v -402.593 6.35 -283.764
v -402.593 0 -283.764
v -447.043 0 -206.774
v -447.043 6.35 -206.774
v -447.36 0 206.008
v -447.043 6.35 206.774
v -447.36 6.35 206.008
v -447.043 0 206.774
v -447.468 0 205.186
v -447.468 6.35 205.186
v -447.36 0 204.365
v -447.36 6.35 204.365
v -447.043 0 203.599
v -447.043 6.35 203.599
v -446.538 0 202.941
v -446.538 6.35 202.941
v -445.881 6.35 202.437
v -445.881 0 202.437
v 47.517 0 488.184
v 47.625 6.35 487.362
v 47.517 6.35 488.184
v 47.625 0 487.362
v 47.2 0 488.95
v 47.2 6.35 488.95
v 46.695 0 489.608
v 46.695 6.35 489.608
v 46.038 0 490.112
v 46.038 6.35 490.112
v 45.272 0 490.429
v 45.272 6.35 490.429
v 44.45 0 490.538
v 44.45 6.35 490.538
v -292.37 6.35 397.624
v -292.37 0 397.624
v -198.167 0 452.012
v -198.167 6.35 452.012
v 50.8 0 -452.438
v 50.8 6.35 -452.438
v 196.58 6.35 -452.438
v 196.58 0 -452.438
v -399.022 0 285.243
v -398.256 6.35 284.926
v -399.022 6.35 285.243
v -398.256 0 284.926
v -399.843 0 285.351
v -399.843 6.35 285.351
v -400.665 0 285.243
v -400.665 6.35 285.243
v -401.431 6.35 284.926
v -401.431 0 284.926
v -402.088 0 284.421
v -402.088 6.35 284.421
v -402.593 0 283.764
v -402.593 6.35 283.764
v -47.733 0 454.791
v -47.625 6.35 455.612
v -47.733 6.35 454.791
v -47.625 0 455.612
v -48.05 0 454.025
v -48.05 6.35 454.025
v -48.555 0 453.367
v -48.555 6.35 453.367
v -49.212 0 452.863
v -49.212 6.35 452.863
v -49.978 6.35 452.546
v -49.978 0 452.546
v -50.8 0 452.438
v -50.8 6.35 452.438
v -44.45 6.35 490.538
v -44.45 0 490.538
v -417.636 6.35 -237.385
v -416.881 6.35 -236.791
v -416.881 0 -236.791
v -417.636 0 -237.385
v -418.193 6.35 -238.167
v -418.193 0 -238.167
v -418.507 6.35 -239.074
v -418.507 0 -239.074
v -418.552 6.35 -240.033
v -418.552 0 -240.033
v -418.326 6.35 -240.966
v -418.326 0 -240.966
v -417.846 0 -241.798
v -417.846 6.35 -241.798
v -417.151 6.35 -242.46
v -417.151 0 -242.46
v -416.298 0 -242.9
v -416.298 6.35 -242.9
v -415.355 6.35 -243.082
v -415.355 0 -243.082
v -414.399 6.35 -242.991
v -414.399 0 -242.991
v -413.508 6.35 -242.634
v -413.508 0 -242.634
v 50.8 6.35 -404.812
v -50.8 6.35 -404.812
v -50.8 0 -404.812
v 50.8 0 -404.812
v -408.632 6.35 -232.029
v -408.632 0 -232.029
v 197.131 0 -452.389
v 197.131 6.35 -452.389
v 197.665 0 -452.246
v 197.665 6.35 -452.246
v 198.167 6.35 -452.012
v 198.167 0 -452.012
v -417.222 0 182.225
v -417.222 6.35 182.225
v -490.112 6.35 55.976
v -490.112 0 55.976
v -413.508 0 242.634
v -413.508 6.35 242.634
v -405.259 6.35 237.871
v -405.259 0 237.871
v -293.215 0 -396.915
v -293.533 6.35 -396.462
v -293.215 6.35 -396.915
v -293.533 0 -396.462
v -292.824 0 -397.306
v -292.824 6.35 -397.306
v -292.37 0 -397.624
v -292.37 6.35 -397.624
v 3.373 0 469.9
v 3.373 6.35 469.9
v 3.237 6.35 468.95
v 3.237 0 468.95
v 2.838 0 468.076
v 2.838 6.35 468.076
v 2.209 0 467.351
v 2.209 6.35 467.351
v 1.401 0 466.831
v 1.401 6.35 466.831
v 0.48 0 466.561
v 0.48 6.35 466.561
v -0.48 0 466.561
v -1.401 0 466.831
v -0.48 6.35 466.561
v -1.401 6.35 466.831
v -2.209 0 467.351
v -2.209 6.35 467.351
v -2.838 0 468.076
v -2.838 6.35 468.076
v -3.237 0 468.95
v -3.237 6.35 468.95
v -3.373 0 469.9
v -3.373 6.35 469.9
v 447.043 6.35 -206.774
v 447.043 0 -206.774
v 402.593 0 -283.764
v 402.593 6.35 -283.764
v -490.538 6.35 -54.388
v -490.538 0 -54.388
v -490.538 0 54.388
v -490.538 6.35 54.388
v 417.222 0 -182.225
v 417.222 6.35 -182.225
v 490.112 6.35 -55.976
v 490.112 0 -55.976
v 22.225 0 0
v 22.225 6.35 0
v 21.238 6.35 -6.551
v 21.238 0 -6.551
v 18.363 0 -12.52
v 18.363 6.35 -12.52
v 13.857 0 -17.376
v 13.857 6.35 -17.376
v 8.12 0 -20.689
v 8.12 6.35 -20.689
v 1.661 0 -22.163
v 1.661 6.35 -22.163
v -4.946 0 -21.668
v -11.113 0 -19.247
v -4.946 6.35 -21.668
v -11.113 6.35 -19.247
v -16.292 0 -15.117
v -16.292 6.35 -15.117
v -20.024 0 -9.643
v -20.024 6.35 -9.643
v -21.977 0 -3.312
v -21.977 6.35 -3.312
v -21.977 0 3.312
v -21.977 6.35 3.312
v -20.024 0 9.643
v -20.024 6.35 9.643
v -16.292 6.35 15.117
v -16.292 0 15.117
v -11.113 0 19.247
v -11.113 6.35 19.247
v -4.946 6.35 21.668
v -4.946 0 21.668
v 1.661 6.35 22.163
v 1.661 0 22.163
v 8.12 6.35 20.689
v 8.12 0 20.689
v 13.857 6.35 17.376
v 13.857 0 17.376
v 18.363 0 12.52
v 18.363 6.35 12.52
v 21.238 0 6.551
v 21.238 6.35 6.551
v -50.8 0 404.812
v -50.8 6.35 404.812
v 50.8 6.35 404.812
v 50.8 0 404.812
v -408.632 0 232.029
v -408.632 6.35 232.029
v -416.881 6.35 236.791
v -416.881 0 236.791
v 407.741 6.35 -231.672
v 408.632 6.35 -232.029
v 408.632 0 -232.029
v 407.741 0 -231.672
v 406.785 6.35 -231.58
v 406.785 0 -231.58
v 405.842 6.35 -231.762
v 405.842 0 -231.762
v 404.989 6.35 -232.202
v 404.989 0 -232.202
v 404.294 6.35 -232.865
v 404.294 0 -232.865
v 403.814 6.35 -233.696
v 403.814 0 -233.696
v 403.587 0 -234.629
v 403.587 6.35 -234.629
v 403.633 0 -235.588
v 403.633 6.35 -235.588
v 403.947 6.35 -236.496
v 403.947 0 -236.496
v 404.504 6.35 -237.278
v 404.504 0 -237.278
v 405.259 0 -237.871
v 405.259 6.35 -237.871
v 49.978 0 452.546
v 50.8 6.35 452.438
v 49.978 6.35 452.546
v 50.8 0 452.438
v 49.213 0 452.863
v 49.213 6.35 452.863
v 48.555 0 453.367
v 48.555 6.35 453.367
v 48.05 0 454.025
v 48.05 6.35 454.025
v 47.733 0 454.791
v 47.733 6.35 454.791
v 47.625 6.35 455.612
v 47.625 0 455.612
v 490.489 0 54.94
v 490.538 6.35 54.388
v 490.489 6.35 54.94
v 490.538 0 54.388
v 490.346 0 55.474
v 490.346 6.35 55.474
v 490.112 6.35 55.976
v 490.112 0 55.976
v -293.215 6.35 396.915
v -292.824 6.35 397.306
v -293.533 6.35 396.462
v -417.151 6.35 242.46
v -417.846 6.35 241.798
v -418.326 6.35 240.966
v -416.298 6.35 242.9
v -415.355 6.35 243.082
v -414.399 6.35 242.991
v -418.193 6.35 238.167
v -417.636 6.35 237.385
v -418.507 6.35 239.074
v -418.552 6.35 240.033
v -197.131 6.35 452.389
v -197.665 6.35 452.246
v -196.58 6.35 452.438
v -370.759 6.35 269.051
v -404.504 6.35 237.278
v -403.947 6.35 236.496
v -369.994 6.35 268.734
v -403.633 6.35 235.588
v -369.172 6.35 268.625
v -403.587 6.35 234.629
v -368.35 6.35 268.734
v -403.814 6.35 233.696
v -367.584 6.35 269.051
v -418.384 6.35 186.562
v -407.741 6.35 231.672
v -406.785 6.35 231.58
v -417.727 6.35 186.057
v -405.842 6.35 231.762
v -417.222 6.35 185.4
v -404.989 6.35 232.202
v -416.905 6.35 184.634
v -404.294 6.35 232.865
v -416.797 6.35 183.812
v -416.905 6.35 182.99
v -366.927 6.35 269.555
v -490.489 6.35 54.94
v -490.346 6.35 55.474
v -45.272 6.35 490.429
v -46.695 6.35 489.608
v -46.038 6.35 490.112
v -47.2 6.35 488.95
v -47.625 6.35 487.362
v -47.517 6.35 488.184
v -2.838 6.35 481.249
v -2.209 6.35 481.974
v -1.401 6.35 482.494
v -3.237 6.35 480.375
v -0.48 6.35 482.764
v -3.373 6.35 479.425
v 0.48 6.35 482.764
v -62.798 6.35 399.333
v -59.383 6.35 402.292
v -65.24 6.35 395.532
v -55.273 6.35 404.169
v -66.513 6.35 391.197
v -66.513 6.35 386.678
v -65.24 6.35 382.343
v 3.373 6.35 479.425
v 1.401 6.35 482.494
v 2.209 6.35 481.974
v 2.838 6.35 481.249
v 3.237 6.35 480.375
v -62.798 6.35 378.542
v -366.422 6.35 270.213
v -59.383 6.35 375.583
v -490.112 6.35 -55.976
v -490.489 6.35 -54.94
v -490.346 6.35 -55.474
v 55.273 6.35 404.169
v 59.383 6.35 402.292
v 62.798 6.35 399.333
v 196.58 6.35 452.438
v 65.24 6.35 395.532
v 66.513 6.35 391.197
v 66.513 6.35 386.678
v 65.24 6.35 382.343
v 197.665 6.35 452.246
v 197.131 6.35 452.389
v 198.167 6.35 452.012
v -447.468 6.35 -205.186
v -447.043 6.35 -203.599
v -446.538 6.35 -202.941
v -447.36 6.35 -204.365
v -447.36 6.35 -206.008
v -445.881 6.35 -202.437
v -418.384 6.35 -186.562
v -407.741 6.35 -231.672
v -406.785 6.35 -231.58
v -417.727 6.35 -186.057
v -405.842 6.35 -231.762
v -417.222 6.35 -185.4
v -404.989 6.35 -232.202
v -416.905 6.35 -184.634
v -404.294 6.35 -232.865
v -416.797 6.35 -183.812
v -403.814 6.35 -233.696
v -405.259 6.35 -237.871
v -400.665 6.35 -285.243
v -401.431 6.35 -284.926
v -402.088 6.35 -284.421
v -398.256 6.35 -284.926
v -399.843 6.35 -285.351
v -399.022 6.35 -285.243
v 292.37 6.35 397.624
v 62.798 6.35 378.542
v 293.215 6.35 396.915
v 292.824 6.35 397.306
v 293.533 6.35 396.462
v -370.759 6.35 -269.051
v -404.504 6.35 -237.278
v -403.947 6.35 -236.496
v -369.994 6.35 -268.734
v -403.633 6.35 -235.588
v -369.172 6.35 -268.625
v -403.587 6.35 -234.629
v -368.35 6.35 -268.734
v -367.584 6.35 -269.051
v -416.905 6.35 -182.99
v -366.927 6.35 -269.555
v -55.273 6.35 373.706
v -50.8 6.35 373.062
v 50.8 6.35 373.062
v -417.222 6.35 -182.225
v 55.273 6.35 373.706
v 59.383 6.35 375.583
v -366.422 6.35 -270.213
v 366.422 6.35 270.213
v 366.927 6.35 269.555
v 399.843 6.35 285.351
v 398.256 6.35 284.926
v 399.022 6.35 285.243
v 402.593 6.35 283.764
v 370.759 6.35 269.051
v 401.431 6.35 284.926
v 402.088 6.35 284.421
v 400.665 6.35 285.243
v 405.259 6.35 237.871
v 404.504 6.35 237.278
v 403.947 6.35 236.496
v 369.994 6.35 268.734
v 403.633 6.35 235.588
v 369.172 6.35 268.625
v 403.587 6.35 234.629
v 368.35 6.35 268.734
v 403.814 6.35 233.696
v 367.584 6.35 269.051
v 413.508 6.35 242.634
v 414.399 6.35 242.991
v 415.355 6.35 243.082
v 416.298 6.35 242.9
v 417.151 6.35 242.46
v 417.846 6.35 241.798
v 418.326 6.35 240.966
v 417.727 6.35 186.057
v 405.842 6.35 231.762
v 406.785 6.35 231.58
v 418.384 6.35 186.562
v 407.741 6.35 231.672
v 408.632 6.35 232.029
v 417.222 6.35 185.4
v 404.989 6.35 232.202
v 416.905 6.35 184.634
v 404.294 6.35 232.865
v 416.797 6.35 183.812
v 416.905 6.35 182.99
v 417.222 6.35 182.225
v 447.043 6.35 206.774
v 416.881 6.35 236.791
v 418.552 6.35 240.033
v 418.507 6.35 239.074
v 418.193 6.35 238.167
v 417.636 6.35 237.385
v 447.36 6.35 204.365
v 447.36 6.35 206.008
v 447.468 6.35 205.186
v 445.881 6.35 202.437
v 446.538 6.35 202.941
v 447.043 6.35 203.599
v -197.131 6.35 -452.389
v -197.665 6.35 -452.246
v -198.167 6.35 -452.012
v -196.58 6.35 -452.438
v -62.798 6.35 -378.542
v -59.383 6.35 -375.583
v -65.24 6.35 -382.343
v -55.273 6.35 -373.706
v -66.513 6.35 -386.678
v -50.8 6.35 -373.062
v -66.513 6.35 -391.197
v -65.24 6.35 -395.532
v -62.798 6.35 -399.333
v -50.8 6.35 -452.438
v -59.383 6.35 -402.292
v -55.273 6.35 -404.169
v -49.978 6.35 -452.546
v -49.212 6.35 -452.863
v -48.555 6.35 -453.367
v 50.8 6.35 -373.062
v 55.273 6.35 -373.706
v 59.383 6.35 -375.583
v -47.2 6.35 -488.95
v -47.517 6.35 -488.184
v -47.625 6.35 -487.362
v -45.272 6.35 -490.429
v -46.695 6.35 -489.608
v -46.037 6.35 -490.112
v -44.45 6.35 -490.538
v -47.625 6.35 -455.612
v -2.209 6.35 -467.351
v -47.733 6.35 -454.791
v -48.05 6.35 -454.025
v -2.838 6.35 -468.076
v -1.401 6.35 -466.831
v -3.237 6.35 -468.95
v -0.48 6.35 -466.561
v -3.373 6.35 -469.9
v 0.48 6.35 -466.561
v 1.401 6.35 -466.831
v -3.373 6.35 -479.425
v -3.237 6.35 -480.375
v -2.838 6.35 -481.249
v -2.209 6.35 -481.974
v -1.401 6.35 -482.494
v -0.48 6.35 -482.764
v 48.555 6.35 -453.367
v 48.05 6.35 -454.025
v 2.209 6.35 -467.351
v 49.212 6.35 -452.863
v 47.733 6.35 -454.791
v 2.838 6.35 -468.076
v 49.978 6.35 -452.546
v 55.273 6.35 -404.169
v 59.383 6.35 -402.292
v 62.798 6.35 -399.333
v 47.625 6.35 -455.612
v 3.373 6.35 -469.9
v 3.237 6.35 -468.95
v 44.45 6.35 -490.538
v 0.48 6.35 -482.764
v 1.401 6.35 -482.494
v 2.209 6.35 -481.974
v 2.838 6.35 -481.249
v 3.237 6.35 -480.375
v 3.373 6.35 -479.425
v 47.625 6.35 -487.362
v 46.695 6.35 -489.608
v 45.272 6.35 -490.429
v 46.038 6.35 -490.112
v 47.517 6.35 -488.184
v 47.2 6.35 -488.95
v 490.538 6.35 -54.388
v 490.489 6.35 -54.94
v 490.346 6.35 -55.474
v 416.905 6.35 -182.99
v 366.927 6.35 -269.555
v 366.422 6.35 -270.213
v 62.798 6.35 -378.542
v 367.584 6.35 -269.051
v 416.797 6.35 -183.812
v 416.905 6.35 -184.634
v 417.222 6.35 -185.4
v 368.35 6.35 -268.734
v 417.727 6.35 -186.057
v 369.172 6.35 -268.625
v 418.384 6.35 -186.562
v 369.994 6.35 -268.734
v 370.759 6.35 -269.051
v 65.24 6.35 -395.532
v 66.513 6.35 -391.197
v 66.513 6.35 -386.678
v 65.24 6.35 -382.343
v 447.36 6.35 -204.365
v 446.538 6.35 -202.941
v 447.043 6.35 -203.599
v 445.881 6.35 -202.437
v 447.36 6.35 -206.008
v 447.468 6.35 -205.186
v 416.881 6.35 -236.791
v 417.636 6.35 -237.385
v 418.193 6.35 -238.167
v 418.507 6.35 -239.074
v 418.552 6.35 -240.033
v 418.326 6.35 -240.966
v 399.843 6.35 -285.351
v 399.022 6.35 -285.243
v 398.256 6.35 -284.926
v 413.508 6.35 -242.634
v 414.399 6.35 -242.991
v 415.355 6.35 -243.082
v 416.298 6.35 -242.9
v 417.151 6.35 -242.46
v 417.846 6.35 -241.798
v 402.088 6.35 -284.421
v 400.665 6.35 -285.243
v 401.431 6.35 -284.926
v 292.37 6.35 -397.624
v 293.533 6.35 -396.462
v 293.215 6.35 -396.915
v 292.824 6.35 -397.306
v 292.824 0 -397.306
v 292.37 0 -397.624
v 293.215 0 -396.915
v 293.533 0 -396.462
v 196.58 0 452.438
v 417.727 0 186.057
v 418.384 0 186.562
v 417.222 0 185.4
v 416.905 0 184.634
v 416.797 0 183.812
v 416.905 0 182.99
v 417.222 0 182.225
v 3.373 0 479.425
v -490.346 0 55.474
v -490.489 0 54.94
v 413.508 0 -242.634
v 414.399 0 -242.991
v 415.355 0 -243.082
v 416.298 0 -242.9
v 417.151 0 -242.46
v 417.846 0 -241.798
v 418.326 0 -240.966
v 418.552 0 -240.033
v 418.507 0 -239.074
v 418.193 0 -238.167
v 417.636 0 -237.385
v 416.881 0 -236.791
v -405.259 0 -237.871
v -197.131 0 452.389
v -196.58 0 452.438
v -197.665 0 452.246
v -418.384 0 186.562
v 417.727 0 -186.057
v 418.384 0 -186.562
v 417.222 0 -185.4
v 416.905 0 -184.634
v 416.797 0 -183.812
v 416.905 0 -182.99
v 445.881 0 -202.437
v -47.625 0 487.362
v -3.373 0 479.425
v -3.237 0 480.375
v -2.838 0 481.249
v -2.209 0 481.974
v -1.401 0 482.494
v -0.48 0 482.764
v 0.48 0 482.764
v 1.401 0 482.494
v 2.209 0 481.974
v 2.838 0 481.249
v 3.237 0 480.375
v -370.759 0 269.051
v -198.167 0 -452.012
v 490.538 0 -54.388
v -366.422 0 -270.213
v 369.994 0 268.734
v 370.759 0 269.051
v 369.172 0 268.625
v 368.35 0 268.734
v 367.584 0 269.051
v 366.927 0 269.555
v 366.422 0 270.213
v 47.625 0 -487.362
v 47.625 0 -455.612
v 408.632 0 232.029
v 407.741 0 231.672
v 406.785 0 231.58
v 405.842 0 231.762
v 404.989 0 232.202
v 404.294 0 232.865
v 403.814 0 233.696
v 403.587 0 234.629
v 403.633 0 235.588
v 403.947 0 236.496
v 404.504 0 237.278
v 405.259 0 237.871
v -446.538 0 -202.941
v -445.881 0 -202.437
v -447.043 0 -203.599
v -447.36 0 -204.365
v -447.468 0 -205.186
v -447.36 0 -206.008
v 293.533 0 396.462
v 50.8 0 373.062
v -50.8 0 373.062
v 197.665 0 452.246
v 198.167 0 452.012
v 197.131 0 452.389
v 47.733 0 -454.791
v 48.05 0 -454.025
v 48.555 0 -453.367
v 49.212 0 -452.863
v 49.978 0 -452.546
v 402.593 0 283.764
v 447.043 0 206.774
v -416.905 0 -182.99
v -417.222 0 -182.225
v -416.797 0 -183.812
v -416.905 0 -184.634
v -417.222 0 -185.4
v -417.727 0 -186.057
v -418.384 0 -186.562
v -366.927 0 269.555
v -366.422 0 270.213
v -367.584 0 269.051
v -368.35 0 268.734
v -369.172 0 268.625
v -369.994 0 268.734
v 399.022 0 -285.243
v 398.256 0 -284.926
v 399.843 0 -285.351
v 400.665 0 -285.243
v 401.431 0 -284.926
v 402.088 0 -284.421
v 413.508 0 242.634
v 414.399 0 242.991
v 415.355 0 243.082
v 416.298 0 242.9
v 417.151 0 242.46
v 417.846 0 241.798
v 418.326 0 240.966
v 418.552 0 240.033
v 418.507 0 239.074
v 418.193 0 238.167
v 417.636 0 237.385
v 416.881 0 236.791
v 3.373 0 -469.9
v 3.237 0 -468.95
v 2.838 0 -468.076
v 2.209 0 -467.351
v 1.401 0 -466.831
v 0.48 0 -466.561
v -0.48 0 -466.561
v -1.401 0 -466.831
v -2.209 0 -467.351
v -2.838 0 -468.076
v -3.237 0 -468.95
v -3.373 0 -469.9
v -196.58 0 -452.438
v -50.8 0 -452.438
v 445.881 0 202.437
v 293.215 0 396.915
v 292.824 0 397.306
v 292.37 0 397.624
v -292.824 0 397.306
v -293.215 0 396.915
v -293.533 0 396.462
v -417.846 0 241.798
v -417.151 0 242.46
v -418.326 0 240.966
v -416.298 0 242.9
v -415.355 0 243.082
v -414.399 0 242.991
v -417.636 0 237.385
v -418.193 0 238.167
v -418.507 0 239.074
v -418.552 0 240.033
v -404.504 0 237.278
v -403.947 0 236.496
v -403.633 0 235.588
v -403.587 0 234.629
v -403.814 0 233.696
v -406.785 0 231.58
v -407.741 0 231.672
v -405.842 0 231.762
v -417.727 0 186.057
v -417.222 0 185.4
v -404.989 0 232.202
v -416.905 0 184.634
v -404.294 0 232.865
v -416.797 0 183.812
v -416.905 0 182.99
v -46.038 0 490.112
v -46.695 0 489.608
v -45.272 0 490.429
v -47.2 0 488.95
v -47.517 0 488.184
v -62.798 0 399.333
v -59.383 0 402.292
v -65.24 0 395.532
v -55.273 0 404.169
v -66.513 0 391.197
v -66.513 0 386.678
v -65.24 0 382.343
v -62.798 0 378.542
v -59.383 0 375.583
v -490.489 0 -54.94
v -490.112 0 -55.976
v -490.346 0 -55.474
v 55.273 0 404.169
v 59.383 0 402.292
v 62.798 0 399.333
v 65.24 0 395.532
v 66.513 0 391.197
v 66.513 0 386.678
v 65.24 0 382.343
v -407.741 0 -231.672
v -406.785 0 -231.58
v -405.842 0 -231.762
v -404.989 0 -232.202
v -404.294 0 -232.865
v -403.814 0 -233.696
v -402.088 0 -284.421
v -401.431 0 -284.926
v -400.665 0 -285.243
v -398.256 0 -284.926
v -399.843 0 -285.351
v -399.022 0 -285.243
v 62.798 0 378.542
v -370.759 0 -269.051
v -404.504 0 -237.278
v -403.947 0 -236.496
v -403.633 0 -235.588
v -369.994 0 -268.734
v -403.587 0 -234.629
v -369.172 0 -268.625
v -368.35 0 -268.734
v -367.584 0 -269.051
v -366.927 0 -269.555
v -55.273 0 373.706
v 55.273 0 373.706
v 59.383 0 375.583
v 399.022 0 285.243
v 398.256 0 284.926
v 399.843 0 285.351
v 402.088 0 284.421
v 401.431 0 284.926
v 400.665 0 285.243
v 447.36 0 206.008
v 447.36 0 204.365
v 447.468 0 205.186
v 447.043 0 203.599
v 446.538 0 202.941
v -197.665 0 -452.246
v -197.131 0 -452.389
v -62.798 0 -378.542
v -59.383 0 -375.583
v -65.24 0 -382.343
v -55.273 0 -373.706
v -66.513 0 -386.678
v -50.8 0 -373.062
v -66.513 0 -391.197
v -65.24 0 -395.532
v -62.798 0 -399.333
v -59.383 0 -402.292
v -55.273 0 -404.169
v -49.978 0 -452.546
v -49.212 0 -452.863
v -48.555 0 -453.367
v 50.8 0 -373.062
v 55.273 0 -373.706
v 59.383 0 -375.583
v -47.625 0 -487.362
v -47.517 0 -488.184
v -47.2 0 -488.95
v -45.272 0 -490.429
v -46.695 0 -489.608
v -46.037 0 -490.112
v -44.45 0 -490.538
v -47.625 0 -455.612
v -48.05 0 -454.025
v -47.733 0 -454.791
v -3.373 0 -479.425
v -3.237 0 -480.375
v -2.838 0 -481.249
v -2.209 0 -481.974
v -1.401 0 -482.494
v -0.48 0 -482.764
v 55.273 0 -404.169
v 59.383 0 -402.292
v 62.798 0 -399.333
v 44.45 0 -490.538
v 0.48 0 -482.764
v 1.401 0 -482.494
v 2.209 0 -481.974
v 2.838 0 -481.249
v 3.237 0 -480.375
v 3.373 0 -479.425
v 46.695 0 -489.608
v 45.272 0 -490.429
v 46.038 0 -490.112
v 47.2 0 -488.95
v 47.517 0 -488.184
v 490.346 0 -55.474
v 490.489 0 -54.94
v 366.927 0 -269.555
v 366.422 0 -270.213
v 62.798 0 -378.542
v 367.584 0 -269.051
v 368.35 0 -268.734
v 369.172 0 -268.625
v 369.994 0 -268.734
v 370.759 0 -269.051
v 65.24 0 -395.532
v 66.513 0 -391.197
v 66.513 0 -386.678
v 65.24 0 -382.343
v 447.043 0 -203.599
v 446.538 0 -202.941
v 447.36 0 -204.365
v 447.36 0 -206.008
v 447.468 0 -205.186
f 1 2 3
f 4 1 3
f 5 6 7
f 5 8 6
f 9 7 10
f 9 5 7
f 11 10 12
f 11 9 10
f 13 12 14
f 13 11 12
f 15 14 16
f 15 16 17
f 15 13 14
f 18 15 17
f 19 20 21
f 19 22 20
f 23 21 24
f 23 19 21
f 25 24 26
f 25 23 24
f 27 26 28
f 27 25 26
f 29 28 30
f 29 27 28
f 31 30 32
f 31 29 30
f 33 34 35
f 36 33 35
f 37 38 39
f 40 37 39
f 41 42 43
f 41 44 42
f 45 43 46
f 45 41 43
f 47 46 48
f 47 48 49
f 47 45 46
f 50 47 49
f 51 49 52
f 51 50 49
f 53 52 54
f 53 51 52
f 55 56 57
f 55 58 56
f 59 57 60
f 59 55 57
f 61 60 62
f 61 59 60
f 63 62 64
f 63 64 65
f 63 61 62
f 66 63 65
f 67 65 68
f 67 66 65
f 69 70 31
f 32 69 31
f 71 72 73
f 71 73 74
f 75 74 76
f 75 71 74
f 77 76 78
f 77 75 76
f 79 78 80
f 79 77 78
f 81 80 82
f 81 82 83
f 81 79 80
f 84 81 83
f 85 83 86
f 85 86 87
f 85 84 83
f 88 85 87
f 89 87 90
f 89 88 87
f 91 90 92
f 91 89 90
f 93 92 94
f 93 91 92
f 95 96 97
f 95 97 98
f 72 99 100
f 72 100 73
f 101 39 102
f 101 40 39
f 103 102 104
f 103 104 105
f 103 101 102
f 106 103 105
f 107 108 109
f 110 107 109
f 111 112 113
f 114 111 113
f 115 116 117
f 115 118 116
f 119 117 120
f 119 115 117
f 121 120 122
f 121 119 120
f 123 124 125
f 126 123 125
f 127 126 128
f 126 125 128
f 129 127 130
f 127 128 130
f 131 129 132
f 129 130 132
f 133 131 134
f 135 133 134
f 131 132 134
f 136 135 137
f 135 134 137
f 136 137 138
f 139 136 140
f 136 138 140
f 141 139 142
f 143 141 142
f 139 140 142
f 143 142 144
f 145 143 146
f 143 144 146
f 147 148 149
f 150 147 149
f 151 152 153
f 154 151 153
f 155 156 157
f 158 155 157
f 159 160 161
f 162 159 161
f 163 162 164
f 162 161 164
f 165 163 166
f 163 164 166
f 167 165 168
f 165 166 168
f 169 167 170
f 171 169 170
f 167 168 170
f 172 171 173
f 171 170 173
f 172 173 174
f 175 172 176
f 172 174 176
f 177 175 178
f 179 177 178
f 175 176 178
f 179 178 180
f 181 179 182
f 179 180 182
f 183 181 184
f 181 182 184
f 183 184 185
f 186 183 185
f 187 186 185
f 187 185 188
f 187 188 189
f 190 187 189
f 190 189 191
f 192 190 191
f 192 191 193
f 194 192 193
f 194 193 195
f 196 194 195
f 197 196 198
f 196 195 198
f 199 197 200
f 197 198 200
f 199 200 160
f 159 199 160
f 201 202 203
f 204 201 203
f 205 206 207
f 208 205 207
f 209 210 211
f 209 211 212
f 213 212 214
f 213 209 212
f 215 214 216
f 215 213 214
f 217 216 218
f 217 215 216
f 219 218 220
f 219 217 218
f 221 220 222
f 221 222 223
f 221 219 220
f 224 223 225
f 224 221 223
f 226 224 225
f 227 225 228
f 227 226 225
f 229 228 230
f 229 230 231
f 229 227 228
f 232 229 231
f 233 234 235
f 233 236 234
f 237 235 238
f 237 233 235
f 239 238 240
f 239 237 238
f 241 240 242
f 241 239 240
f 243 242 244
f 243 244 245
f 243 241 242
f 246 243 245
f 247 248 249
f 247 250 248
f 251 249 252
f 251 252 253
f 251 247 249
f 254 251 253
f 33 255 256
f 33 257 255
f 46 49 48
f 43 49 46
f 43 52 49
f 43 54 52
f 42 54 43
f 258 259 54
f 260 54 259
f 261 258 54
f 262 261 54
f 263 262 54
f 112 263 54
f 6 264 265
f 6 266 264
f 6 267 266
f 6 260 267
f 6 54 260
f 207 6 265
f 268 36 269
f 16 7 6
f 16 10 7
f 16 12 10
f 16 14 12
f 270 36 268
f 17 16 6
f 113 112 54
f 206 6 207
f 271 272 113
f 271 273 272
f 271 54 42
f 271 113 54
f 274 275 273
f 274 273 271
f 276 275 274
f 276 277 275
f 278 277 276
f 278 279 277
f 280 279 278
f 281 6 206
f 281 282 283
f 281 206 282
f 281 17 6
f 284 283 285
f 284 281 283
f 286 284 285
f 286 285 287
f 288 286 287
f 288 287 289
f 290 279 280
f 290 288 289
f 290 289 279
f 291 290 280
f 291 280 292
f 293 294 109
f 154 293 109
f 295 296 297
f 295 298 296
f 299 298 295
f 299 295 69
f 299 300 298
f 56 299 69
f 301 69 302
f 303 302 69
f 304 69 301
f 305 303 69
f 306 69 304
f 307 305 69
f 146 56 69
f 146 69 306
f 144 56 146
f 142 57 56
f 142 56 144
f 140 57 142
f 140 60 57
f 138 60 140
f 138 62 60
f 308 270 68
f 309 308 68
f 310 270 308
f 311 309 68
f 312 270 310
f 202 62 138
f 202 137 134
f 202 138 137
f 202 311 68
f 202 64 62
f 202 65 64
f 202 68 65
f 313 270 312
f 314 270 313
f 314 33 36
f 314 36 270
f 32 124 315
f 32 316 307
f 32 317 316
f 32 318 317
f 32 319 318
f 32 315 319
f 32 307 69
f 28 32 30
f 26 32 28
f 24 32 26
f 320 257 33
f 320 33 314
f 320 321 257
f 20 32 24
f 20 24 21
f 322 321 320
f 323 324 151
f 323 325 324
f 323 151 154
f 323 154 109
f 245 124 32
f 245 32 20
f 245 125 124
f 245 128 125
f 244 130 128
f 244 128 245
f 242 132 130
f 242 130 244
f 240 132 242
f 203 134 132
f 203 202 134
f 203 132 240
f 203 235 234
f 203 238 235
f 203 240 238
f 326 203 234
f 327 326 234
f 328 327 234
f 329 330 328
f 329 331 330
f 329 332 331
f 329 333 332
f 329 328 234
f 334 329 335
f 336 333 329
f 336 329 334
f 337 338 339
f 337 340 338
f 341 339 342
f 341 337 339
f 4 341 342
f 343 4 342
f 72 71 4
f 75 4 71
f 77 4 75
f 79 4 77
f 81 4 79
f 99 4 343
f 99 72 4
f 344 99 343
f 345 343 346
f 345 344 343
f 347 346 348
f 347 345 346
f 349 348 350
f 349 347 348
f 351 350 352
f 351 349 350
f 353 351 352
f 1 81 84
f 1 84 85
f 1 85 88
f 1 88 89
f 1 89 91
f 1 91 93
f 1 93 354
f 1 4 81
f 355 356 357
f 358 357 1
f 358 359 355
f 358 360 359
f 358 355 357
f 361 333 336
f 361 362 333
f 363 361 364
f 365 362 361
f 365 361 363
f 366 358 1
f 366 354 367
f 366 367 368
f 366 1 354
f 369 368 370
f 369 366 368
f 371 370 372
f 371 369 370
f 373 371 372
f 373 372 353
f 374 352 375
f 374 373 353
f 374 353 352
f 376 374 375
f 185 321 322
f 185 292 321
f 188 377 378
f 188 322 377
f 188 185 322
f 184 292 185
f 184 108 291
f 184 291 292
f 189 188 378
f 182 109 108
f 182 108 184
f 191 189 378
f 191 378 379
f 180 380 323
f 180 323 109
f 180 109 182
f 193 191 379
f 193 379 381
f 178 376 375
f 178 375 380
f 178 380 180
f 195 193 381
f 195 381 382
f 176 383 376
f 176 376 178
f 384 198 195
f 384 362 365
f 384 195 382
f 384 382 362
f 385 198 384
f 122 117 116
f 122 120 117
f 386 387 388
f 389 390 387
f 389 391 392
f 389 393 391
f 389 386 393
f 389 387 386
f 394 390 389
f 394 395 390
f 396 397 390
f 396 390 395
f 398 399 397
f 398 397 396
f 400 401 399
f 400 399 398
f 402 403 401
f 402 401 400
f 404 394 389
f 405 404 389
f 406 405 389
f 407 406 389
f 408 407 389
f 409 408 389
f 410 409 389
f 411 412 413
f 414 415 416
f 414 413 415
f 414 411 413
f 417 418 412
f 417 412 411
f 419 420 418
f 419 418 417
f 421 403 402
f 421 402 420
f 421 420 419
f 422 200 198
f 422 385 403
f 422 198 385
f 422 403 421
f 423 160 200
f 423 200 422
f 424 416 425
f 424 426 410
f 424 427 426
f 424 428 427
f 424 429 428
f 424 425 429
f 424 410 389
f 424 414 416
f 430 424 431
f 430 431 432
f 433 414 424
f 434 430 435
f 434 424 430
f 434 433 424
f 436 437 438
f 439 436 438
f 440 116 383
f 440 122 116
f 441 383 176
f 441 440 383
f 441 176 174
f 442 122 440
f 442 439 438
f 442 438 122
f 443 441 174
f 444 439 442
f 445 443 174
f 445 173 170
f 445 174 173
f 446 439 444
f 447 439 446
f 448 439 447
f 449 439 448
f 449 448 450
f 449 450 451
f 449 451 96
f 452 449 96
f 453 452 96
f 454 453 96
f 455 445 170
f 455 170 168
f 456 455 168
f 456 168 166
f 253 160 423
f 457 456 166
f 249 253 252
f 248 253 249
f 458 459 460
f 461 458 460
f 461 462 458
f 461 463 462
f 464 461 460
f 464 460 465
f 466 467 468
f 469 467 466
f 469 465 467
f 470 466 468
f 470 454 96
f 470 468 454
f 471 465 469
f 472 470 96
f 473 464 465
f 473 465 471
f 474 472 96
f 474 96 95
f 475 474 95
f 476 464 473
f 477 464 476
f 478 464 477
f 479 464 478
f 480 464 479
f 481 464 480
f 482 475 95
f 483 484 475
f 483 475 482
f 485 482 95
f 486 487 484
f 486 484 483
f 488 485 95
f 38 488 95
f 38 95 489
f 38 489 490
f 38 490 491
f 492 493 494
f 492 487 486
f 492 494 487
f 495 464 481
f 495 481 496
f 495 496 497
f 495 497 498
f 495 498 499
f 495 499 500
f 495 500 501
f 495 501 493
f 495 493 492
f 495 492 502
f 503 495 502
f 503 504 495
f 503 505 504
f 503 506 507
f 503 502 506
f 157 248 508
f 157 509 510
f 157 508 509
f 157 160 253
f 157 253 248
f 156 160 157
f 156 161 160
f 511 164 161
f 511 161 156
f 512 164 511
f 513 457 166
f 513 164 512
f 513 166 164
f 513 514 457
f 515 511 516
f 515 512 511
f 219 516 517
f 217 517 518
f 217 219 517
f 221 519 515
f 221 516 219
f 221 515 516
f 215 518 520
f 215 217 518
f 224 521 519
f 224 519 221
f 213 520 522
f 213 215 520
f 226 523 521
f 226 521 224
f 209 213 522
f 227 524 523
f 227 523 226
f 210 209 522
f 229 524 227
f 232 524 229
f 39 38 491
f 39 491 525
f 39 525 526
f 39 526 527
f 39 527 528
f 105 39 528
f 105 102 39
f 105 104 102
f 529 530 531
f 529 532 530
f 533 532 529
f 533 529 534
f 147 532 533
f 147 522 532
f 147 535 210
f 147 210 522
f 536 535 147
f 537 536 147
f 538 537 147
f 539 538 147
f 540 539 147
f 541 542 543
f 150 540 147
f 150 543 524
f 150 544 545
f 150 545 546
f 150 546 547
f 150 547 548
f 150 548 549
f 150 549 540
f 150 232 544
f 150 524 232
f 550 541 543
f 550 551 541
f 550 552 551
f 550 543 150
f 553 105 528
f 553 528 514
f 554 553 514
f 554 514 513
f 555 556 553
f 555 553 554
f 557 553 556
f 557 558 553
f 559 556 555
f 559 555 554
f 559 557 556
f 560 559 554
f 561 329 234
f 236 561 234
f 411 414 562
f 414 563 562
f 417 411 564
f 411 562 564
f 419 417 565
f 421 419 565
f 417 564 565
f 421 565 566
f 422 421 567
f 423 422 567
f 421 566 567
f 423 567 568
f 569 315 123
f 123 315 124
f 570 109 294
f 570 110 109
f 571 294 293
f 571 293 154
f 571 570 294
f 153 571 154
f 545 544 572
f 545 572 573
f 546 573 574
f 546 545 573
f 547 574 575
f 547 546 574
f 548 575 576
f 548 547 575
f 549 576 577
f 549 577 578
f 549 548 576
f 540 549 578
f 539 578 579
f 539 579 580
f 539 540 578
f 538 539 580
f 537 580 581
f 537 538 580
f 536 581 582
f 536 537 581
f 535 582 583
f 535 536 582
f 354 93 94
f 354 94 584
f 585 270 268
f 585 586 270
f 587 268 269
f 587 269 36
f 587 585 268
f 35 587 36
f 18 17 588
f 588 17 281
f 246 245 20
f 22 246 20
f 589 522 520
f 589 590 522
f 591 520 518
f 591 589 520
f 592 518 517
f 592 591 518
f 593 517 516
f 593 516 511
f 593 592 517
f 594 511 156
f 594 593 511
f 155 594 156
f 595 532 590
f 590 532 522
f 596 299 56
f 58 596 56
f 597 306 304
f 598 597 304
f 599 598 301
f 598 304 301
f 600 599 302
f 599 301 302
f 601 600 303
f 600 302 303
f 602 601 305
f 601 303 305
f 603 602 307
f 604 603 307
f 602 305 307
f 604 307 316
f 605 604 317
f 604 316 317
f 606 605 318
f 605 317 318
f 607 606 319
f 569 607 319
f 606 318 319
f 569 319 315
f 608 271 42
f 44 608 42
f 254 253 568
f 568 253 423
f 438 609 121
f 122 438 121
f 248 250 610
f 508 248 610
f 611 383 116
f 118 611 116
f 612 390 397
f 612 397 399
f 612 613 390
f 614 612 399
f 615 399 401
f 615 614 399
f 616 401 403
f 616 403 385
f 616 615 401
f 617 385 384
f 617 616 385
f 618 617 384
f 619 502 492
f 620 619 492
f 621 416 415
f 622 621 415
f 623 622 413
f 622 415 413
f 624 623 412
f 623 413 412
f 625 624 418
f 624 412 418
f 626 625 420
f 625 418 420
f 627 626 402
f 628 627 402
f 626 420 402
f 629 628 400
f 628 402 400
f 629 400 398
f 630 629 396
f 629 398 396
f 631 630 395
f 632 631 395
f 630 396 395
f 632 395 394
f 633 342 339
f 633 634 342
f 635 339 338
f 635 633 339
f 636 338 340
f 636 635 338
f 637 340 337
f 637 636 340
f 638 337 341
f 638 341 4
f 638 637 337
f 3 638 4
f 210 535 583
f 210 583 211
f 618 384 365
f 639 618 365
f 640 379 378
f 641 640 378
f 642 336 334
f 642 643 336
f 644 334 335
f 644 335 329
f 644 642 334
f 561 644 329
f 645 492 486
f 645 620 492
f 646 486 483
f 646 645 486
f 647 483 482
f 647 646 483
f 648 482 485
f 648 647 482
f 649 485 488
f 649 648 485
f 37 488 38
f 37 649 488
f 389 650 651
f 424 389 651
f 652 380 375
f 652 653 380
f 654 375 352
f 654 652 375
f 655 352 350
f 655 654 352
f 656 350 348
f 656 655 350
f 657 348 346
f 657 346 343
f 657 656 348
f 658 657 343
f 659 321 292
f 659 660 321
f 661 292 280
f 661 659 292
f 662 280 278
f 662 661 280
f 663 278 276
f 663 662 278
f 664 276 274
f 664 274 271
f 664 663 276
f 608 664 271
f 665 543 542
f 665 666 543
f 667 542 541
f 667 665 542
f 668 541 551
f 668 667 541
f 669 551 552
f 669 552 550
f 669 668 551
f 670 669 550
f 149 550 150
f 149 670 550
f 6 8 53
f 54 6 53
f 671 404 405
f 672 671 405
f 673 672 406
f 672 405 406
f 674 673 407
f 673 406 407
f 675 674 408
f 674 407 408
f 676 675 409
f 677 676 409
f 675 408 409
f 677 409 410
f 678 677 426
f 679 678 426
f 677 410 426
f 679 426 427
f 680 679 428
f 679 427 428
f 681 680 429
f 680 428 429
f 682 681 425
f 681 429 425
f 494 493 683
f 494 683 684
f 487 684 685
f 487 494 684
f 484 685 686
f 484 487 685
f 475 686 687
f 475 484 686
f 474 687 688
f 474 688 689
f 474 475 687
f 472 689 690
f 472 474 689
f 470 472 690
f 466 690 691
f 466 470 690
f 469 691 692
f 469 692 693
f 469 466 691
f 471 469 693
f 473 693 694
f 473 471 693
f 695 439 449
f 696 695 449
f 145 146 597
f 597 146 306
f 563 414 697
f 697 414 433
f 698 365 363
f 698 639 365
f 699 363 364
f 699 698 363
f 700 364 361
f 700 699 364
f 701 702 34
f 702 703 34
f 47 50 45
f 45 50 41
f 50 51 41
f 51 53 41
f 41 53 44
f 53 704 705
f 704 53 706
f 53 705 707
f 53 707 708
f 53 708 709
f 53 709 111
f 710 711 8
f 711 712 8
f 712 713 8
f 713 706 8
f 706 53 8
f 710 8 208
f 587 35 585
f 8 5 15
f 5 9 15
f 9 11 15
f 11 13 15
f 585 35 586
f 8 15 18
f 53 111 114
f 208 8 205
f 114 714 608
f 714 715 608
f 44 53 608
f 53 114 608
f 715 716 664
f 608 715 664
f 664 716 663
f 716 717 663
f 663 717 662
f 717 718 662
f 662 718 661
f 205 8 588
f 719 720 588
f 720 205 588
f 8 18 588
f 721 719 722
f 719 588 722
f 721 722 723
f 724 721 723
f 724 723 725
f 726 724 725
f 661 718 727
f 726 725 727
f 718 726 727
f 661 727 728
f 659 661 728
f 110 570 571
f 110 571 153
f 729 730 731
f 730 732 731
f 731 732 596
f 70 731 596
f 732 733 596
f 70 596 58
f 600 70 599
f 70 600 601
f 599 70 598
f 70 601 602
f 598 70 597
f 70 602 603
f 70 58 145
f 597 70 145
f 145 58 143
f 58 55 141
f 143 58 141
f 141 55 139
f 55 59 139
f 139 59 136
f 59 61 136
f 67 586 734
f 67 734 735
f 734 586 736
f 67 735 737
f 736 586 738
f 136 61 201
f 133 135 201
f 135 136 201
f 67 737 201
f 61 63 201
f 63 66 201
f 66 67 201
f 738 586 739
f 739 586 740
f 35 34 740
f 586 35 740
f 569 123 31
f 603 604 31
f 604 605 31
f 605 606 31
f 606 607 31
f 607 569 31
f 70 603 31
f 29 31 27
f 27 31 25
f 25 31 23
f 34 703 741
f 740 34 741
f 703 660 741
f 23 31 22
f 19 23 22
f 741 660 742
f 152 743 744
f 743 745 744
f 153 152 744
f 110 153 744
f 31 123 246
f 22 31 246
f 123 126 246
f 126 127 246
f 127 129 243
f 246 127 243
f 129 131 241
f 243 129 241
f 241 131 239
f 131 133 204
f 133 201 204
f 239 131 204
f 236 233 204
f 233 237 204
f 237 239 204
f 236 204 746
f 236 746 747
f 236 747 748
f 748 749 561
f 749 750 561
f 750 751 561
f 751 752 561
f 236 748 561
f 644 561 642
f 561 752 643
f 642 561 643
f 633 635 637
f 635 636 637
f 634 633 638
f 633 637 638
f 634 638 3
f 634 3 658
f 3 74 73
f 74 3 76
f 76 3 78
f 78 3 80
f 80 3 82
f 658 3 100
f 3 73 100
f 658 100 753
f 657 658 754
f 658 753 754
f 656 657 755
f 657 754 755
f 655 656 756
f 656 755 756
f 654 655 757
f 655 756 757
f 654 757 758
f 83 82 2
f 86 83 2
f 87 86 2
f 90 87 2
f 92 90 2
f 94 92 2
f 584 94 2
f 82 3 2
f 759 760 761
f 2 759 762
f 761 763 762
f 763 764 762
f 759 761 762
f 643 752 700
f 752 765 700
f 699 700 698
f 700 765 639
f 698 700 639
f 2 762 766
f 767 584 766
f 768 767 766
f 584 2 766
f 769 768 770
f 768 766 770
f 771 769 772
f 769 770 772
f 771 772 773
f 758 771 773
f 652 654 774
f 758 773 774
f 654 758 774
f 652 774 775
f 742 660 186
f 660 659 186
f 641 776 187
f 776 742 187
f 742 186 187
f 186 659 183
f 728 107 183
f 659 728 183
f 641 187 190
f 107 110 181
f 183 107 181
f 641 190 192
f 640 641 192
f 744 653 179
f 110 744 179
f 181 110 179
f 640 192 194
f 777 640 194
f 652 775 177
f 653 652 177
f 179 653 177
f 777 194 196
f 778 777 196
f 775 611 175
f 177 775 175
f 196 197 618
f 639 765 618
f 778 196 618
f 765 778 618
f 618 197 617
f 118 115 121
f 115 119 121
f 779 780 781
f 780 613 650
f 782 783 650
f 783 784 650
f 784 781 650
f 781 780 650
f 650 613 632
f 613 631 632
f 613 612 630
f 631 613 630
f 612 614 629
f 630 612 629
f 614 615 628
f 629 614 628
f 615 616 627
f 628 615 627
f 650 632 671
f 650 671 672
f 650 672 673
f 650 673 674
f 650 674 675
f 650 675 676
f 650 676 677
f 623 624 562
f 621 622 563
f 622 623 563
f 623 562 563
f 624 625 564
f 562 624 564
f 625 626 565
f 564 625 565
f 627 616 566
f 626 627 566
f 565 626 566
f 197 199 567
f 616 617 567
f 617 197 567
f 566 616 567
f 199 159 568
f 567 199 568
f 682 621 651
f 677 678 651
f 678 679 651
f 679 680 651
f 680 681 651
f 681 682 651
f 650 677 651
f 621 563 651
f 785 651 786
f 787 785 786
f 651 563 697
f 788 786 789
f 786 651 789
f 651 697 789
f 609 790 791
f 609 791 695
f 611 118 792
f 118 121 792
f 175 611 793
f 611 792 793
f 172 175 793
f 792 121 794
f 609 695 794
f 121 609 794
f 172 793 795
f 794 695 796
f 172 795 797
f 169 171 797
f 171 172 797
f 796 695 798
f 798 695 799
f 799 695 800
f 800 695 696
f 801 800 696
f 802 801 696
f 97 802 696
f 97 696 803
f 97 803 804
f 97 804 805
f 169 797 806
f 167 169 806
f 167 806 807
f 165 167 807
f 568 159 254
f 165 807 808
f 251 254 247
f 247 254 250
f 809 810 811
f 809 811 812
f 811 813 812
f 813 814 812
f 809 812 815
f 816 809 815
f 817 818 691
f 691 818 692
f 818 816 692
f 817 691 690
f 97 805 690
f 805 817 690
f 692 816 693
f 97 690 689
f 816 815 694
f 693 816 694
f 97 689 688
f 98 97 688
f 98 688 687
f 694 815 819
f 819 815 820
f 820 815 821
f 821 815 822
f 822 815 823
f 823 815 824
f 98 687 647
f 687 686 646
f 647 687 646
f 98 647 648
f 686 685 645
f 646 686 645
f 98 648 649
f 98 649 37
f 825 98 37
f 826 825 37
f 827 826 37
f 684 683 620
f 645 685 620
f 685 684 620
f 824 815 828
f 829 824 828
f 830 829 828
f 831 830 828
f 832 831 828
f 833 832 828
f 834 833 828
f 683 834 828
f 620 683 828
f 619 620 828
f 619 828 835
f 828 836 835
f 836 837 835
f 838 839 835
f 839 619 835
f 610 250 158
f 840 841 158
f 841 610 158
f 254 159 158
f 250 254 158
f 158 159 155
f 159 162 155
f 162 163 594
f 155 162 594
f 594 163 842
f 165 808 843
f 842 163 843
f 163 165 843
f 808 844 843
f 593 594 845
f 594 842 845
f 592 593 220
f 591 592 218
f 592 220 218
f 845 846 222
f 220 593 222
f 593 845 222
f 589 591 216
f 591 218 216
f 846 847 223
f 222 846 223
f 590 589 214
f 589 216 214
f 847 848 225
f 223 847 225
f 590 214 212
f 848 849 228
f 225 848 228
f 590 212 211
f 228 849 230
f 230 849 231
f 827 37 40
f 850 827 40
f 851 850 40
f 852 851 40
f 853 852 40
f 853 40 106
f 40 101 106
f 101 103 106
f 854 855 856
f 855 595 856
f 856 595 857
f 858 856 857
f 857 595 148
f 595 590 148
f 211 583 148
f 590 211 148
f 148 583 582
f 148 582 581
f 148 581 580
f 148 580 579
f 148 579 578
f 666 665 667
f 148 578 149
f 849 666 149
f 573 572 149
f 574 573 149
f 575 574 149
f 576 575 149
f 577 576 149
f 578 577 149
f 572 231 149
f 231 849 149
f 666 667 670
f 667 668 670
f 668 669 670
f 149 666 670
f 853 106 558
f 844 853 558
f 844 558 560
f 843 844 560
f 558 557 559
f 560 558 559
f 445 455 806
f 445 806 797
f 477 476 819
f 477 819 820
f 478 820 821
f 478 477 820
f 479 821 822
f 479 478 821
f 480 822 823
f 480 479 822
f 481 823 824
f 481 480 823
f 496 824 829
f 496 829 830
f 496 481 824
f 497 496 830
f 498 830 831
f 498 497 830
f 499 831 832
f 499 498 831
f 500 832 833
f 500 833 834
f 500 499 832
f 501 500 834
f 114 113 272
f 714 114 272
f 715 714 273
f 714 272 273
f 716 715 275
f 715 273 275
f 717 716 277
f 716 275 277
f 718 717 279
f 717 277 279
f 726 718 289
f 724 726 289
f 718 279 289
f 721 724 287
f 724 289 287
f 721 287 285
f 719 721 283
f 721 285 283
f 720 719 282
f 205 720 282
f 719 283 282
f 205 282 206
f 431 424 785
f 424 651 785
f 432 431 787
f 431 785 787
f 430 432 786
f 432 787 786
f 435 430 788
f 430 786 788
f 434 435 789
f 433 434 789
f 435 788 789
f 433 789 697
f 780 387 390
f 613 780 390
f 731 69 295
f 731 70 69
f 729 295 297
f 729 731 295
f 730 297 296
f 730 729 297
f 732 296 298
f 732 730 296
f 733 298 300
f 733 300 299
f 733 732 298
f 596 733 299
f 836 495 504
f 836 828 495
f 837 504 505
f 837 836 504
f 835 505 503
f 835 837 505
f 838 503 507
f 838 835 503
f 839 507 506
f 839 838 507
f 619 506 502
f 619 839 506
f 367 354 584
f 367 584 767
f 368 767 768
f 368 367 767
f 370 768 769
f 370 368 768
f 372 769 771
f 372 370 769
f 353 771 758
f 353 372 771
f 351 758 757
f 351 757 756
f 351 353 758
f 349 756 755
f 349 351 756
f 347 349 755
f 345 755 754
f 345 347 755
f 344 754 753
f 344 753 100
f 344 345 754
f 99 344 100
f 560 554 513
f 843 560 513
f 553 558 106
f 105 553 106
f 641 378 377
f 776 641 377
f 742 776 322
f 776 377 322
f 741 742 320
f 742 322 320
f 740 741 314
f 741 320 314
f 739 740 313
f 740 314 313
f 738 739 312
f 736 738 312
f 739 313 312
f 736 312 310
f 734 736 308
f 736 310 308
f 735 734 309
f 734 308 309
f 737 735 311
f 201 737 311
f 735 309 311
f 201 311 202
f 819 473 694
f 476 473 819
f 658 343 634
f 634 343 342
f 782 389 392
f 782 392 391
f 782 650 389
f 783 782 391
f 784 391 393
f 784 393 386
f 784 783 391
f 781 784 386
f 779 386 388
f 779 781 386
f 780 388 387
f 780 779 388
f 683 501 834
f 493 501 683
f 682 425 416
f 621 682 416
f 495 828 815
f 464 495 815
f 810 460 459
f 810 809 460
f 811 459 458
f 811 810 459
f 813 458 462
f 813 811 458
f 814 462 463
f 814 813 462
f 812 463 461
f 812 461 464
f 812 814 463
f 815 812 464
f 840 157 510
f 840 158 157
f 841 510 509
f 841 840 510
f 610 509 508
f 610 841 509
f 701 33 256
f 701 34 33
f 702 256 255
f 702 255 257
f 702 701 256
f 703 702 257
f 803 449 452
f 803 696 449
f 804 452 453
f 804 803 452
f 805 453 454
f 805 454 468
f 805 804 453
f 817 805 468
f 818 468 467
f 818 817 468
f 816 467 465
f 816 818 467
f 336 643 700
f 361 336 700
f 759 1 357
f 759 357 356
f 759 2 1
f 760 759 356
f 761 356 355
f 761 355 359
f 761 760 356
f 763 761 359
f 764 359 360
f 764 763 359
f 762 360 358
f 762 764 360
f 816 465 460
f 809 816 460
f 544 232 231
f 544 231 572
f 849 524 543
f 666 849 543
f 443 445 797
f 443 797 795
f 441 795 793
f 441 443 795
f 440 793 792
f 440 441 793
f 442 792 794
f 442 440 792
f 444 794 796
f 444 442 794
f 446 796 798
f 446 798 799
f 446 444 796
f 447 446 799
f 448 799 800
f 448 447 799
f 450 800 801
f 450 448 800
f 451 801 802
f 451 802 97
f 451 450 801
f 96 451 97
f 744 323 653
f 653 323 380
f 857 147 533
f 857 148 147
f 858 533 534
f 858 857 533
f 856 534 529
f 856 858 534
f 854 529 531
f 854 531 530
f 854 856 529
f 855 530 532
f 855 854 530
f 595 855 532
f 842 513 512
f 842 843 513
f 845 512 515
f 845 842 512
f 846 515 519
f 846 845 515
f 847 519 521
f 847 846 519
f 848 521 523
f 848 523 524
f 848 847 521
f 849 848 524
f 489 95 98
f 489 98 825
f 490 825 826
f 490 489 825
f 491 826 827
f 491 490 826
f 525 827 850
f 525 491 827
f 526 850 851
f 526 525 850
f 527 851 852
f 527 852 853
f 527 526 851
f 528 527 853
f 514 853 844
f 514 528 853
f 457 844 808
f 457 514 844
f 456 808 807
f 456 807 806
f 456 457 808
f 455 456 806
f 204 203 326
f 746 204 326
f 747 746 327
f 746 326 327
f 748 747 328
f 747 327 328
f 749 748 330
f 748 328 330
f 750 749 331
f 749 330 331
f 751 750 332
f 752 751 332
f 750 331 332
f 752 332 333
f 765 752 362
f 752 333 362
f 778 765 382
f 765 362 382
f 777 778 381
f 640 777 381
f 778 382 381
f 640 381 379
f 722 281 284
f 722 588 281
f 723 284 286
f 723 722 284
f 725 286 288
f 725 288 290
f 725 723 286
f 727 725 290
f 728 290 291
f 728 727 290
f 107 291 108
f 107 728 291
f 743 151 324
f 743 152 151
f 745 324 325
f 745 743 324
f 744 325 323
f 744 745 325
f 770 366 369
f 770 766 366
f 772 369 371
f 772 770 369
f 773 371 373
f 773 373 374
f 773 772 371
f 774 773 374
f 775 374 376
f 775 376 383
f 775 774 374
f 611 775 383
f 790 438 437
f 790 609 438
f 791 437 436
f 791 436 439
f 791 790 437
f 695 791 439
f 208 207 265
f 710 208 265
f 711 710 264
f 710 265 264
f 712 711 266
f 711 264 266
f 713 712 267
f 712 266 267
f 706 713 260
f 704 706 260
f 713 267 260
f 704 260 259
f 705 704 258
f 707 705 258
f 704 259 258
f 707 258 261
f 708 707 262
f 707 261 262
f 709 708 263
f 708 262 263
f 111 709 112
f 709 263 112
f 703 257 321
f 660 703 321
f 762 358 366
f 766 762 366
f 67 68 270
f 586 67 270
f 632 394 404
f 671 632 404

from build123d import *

# Parameters (mm, degrees)
BOSS_EXTRUDE1_DEPTH = 6.35
SKETCH2_R           = 22.225
CUT_EXTRUDE1_DEPTH  = 6.35
FILLET2_R           = 3.175


with BuildPart() as part:
    # Sketch1 → Boss-Extrude1 (new body)
    with BuildSketch(Plane(origin=(0, 0, 0), x_dir=(1, 0, 0), z_dir=(0, 1, 0))):
        Polygon((359.098373018, -359.098373018), (490.5375, -131.439126982), (490.5375, 131.439126982), (359.098373018, 359.098373018), (131.439126982, 490.5375), (-131.439126982, 490.5375), (-359.098373018, 359.098373018), (-490.5375, 131.439126982), (-490.5375, -131.439126982), (-359.098373018, -359.098373018), (-131.439126982, -490.5375), (131.439126982, -490.5375), align=None)
    extrude(amount=BOSS_EXTRUDE1_DEPTH)

    # Sketch2 → Cut-Extrude1 (cut)
    with BuildSketch(Plane(origin=(0, 6.35, 0), x_dir=(1, 0, 0), z_dir=(0, 1, 0))):
        Circle(SKETCH2_R)
        Polygon((-131.439126982, 490.5375), (-197.430262751, 452.4375), (-47.625, 452.4375), (-47.625, 490.5375), align=None)
        Polygon((131.439126982, 490.5375), (47.625, 490.5375), (47.625, 452.4375), (197.430262751, 452.4375), align=None)
        with BuildLine():
            Line((3.3734375, 479.425), (3.3734375, 469.9))
            ThreePointArc((3.3734375, 469.9), (0, 466.5265625), (-3.3734375, 469.9))
            Line((-3.3734375, 469.9), (-3.3734375, 479.425))
            ThreePointArc((-3.3734375, 479.425), (0, 482.7984375), (3.3734375, 479.425))
        make_face()
        with BuildLine():
            Line((-50.8, 404.8125), (50.8, 404.8125))
            ThreePointArc((50.8, 404.8125), (66.675, 388.9375), (50.8, 373.0625))
            Line((50.8, 373.0625), (-50.8, 373.0625))
            ThreePointArc((-50.8, 373.0625), (-66.675, 388.9375), (-50.8, 404.8125))
        make_face()
        Polygon((401.005436509, 286.513209855), (359.098373018, 359.098373018), (293.107237249, 397.198373018), (368.009868625, 267.463209855), align=None)
        Polygon((490.5375, 55.239126982), (490.5375, 131.439126982), (448.630436509, 204.024290145), (415.634868625, 184.974290145), align=None)
        Polygon((448.630436509, -204.024290145), (490.5375, -131.439126982), (490.5375, -55.239126982), (415.634868625, -184.974290145), align=None)
        Polygon((293.107237249, -397.198373018), (359.098373018, -359.098373018), (401.005436509, -286.513209855), (368.009868625, -267.463209855), align=None)
        Polygon((47.625, -490.5375), (131.439126982, -490.5375), (197.430262751, -452.4375), (47.625, -452.4375), align=None)
        Polygon((-197.430262751, -452.4375), (-131.439126982, -490.5375), (-47.625, -490.5375), (-47.625, -452.4375), align=None)
        Polygon((-401.005436509, -286.513209855), (-359.098373018, -359.098373018), (-293.107237249, -397.198373018), (-368.009868625, -267.463209855), align=None)
        Polygon((-490.5375, -55.239126982), (-490.5375, -131.439126982), (-448.630436509, -204.024290145), (-415.634868625, -184.974290145), align=None)
        Polygon((-448.630436509, 204.024290145), (-490.5375, 131.439126982), (-490.5375, 55.239126982), (-415.634868625, 184.974290145), align=None)
        Polygon((-293.107237249, 397.198373018), (-359.098373018, 359.098373018), (-401.005436509, 286.513209855), (-368.009868625, 267.463209855), align=None)
        with BuildLine():
            Line((-413.507510459, 242.633982573), (-405.258618488, 237.871482573))
            ThreePointArc((-405.258618488, 237.871482573), (-404.023854665, 233.26328125), (-408.632055988, 232.028517427))
            Line((-408.632055988, 232.028517427), (-416.880947959, 236.791017427))
            ThreePointArc((-416.880947959, 236.791017427), (-418.115711782, 241.39921875), (-413.507510459, 242.633982573))
        make_face()
        with BuildLine():
            Line((416.880947959, 236.791017427), (408.632055988, 232.028517427))
            ThreePointArc((408.632055988, 232.028517427), (404.023854665, 233.26328125), (405.258618488, 237.871482573))
            Line((405.258618488, 237.871482573), (413.507510459, 242.633982573))
            ThreePointArc((413.507510459, 242.633982573), (418.115711782, 241.39921875), (416.880947959, 236.791017427))
        make_face()
        with BuildLine():
            Line((416.880947959, -236.791017427), (408.632055988, -232.028517427))
            ThreePointArc((408.632055988, -232.028517427), (404.023854665, -233.26328125), (405.258618488, -237.871482573))
            Line((405.258618488, -237.871482573), (413.507510459, -242.633982573))
            ThreePointArc((413.507510459, -242.633982573), (418.115711782, -241.39921875), (416.880947959, -236.791017427))
        make_face()
        with BuildLine():
            Line((-50.8, -404.8125), (50.8, -404.8125))
            ThreePointArc((50.8, -404.8125), (66.675, -388.9375), (50.8, -373.0625))
            Line((50.8, -373.0625), (-50.8, -373.0625))
            ThreePointArc((-50.8, -373.0625), (-66.675, -388.9375), (-50.8, -404.8125))
        make_face()
        with BuildLine():
            Line((3.3734375, -479.425), (3.3734375, -469.9))
            ThreePointArc((3.3734375, -469.9), (0, -466.5265625), (-3.3734375, -469.9))
            Line((-3.3734375, -469.9), (-3.3734375, -479.425))
            ThreePointArc((-3.3734375, -479.425), (0, -482.7984375), (3.3734375, -479.425))
        make_face()
        with BuildLine():
            Line((-413.507510459, -242.633982573), (-405.258618488, -237.871482573))
            ThreePointArc((-405.258618488, -237.871482573), (-404.023854665, -233.26328125), (-408.632055988, -232.028517427))
            Line((-408.632055988, -232.028517427), (-416.880947959, -236.791017427))
            ThreePointArc((-416.880947959, -236.791017427), (-418.115711782, -241.39921875), (-413.507510459, -242.633982573))
        make_face()
    extrude(amount=-CUT_EXTRUDE1_DEPTH, mode=Mode.SUBTRACT)

    # Fillet2
    fillet2_edges = [part.edges().sort_by_distance(p)[0] for p in [
        (-47.625, 3.175, 490.5375),
        (-197.430262751, 3.175, 452.4375),
        (-47.625, 3.175, 452.4375),
        (-293.107237249, 3.175, 397.198373018),
        (-401.005436509, 3.175, 286.513209855),
        (-368.009868625, 3.175, 267.463209855),
        (-448.630436509, 3.175, 204.024290145),
        (-490.5375, 3.175, 55.239126982),
        (-415.634868625, 3.175, 184.974290145),
        (-490.5375, 3.175, -55.239126982),
        (-448.630436509, 3.175, -204.024290145),
        (-415.634868625, 3.175, -184.974290145),
        (-401.005436509, 3.175, -286.513209855),
        (-293.107237249, 3.175, -397.198373018),
        (-368.009868625, 3.175, -267.463209855),
        (197.430262751, 3.175, 452.4375),
        (47.625, 3.175, 490.5375),
        (47.625, 3.175, 452.4375),
        (401.005436509, 3.175, 286.513209855),
        (293.107237249, 3.175, 397.198373018),
        (368.009868625, 3.175, 267.463209855),
        (490.5375, 3.175, 55.239126982),
        (448.630436509, 3.175, 204.024290145),
        (415.634868625, 3.175, 184.974290145),
        (448.630436509, 3.175, -204.024290145),
        (490.5375, 3.175, -55.239126982),
        (415.634868625, 3.175, -184.974290145),
        (293.107237249, 3.175, -397.198373018),
        (401.005436509, 3.175, -286.513209855),
        (368.009868625, 3.175, -267.463209855),
        (197.430262751, 3.175, -452.4375),
        (47.625, 3.175, -452.4375),
        (47.625, 3.175, -490.5375),
        (-47.625, 3.175, -490.5375),
        (-47.625, 3.175, -452.4375),
        (-197.430262751, 3.175, -452.4375),
    ]]
    fillet(fillet2_edges, radius=FILLET2_R)


solid = part.part
